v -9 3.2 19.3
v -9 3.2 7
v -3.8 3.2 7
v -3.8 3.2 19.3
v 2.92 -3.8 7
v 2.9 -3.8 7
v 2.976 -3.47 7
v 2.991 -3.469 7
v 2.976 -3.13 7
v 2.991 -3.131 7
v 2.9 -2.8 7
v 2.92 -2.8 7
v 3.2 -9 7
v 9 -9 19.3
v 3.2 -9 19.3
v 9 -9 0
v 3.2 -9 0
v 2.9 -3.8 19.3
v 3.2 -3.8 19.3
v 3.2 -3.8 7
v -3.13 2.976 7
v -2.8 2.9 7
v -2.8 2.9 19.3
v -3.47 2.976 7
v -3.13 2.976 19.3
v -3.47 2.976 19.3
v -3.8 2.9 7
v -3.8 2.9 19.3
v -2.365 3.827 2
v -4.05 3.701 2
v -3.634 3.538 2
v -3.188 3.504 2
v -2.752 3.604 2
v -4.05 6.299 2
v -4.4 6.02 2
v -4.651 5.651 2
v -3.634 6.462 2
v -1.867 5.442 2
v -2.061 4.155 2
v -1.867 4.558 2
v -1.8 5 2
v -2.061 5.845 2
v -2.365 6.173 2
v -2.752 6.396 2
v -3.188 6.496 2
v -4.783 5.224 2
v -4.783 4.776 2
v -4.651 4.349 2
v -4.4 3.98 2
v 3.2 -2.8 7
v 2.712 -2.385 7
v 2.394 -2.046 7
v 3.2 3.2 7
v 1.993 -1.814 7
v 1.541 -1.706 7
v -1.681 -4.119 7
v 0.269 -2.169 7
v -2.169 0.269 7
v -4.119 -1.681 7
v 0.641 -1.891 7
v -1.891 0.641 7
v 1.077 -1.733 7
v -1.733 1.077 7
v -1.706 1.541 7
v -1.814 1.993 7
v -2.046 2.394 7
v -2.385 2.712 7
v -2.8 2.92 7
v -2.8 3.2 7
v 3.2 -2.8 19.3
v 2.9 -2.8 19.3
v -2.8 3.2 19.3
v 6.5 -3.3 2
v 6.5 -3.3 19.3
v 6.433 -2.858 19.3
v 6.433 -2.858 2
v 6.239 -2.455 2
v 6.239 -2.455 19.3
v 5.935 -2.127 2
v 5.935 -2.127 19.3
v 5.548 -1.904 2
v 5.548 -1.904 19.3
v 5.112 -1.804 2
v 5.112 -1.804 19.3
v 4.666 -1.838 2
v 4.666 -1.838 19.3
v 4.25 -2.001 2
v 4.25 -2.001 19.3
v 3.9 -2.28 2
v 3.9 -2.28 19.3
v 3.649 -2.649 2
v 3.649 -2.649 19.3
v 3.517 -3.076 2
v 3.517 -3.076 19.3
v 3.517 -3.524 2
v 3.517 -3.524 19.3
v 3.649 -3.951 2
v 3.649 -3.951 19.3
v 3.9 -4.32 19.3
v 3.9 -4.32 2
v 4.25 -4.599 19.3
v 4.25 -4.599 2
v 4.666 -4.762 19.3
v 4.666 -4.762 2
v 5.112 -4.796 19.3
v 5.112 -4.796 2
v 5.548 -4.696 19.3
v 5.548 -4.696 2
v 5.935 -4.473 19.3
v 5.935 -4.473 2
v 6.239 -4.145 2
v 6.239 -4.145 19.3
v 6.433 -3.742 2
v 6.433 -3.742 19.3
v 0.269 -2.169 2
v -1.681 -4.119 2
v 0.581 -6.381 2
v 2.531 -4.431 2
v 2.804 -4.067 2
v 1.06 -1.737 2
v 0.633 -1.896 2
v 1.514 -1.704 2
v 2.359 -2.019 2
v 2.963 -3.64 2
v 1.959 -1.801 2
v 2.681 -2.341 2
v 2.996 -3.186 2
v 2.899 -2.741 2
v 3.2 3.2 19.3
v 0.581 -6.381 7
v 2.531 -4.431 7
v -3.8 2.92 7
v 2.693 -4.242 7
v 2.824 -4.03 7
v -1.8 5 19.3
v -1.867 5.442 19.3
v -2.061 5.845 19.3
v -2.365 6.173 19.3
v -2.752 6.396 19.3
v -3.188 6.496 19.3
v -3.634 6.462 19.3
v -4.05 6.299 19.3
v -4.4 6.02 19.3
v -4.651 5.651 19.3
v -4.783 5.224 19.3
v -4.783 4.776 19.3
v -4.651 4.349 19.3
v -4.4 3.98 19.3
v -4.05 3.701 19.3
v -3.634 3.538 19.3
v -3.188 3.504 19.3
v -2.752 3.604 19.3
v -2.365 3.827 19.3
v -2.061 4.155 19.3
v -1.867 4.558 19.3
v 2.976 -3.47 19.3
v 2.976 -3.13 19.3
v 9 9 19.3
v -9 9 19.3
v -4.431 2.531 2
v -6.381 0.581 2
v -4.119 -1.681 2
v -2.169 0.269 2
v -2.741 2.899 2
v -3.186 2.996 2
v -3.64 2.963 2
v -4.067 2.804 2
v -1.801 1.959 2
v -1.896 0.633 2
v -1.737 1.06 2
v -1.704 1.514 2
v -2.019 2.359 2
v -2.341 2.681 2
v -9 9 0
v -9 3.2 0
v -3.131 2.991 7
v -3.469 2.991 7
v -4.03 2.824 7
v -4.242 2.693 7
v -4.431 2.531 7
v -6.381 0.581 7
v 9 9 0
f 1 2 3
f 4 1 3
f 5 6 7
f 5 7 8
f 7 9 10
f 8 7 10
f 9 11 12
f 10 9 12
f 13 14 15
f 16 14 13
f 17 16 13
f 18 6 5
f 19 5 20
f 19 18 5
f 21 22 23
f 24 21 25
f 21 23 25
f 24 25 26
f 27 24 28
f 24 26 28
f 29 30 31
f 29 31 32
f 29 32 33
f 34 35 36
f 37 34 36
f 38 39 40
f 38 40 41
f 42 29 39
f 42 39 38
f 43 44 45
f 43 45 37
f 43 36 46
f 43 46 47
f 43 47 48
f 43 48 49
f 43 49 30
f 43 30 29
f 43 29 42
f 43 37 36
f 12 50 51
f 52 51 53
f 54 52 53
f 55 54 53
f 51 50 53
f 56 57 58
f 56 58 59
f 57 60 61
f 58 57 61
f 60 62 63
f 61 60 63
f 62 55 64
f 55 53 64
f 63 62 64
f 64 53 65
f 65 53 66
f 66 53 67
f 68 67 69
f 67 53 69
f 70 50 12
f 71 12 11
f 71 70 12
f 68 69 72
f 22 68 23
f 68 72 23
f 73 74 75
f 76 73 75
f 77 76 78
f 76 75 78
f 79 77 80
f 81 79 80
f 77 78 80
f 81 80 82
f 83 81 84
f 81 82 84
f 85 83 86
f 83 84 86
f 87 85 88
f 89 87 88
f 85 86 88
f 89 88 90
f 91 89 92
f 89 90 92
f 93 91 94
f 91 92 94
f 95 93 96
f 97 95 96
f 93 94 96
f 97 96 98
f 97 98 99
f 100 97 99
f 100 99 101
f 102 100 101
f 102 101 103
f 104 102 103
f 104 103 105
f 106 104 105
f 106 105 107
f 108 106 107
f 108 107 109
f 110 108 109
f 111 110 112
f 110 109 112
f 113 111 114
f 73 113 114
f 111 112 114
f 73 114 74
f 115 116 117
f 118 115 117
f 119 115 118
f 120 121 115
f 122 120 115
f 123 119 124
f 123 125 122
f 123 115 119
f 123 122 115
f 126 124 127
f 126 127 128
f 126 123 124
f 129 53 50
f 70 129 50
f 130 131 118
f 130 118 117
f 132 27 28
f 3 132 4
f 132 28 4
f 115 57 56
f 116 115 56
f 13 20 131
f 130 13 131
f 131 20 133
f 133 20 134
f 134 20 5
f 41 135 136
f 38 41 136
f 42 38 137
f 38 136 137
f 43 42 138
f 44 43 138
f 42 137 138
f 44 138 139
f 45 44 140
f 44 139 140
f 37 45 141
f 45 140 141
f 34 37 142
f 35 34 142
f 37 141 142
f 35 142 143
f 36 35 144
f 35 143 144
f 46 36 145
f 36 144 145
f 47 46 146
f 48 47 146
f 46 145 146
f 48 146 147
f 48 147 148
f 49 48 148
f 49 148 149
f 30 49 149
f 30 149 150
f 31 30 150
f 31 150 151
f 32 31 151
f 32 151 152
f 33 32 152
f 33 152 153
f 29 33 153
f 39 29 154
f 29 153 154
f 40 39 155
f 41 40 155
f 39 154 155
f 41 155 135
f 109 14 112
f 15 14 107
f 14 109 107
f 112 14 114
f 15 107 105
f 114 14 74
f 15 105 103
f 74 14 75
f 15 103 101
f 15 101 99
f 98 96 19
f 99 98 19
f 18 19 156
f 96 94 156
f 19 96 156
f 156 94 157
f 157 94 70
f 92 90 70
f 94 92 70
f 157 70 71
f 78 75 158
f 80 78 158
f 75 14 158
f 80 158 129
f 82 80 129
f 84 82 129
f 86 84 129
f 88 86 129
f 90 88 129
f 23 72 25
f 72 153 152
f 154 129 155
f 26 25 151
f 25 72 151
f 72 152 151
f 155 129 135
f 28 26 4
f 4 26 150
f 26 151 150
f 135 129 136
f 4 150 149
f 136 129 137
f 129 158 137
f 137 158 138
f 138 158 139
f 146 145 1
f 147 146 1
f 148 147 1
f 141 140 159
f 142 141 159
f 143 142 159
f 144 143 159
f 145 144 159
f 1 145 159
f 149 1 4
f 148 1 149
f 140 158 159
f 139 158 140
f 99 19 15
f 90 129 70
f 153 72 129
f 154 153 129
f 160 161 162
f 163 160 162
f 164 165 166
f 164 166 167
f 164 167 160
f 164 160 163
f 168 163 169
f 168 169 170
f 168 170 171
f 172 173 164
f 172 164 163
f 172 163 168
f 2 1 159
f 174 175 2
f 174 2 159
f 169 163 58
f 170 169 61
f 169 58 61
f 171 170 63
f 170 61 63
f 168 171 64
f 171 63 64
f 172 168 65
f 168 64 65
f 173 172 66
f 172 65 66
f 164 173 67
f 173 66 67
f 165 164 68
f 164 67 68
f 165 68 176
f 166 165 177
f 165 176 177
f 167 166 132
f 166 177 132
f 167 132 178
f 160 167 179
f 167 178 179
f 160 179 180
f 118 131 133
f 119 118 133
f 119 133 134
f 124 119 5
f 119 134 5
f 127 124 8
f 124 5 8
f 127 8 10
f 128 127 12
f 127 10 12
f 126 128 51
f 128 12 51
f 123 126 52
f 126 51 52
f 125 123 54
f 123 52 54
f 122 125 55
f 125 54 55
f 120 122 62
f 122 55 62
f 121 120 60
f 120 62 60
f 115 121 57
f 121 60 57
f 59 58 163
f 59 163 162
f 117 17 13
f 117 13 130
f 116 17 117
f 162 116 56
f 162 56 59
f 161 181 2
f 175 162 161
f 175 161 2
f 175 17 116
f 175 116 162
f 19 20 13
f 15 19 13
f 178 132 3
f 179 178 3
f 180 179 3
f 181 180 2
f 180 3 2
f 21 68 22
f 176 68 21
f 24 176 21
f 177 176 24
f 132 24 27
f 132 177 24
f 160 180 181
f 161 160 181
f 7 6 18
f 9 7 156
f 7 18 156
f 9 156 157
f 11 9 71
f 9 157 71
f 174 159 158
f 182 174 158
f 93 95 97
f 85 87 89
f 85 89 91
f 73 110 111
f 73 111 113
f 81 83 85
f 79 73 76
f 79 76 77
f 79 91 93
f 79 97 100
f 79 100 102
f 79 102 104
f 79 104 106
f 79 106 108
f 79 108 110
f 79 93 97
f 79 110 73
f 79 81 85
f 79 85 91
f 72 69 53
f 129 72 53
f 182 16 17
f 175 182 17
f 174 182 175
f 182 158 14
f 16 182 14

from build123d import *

# Parameters (mm, degrees)
PAD_DEPTH       = 19.3
POCKET_DEPTH    = 12.301
POCKET002_DEPTH = 5
SKETCH003_R     = 1.5
POCKET003_DEPTH = 17.3
PAD001_DEPTH    = 12.3


with BuildPart() as part:
    # Sketch → Pad (new body)
    with BuildSketch(Plane.XY):
        Polygon((-9, 3.2), (-9, 9), (9, 9), (9, -9), (3.2, -9), align=None)
    extrude(amount=PAD_DEPTH)

    # Sketch001 (on DatumPlane) → Pocket (cut, through all)
    with BuildSketch(Plane.XY.offset(7)):
        Polygon((-9, 3.2), (3.2, 3.2), (3.2, -9), align=None)
    extrude(amount=POCKET_DEPTH, mode=Mode.SUBTRACT)

    # Sketch002 (on DatumPlane) → Pocket002 (cut)
    with BuildSketch(Plane.XY.offset(7)):
        with BuildLine():
            ThreePointArc((-2.168629, 0.268629), (-2.168629, 2.531371), (-4.431371, 2.531371))
            Line((-4.431371, 2.531371), (-6.694113, 0.268629))
            Line((-4.431371, -1.994113), (-6.694113, 0.268629))
            Line((-2.168629, 0.268629), (-4.431371, -1.994113))
        make_face()
        with BuildLine():
            ThreePointArc((2.531371, -4.431371), (2.531371, -2.168629), (0.268629, -2.168629))
            Line((0.268629, -2.168629), (-1.994113, -4.431371))
            Line((0.268629, -6.694113), (-1.994113, -4.431371))
            Line((2.531371, -4.431371), (0.268629, -6.694113))
        make_face()
    extrude(amount=-POCKET002_DEPTH, mode=Mode.SUBTRACT)

    # Sketch003 (on DatumPlane) → Pocket003 (cut)
    with BuildSketch(Plane.XY.offset(19.3)):
        with Locations((-3.3, 5)):
            Circle(SKETCH003_R)
        with Locations((5, -3.3)):
            Circle(SKETCH003_R)
    extrude(amount=-POCKET003_DEPTH, mode=Mode.SUBTRACT)

    # Sketch004 (on DatumPlane) → Pad001 (join)
    with BuildSketch(Plane.XY.offset(19.3)):
        with BuildLine():
            Line((-3.8, 3.2), (-2.8, 3.2))
            Line((-2.8, 3.2), (-2.8, 2.9))
            ThreePointArc((-2.8, 2.9), (-3.3, 2.985786), (-3.8, 2.9))
            Line((-3.8, 2.9), (-3.8, 3.2))
        make_face()
        with BuildLine():
            Line((3.2, -2.8), (2.9, -2.8))
            ThreePointArc((2.9, -3.8), (2.985786, -3.3), (2.9, -2.8))
            Line((2.9, -3.8), (3.2, -3.8))
            Line((3.2, -3.8), (3.2, -2.8))
        make_face()
    extrude(amount=-PAD001_DEPTH)


solid = part.part
